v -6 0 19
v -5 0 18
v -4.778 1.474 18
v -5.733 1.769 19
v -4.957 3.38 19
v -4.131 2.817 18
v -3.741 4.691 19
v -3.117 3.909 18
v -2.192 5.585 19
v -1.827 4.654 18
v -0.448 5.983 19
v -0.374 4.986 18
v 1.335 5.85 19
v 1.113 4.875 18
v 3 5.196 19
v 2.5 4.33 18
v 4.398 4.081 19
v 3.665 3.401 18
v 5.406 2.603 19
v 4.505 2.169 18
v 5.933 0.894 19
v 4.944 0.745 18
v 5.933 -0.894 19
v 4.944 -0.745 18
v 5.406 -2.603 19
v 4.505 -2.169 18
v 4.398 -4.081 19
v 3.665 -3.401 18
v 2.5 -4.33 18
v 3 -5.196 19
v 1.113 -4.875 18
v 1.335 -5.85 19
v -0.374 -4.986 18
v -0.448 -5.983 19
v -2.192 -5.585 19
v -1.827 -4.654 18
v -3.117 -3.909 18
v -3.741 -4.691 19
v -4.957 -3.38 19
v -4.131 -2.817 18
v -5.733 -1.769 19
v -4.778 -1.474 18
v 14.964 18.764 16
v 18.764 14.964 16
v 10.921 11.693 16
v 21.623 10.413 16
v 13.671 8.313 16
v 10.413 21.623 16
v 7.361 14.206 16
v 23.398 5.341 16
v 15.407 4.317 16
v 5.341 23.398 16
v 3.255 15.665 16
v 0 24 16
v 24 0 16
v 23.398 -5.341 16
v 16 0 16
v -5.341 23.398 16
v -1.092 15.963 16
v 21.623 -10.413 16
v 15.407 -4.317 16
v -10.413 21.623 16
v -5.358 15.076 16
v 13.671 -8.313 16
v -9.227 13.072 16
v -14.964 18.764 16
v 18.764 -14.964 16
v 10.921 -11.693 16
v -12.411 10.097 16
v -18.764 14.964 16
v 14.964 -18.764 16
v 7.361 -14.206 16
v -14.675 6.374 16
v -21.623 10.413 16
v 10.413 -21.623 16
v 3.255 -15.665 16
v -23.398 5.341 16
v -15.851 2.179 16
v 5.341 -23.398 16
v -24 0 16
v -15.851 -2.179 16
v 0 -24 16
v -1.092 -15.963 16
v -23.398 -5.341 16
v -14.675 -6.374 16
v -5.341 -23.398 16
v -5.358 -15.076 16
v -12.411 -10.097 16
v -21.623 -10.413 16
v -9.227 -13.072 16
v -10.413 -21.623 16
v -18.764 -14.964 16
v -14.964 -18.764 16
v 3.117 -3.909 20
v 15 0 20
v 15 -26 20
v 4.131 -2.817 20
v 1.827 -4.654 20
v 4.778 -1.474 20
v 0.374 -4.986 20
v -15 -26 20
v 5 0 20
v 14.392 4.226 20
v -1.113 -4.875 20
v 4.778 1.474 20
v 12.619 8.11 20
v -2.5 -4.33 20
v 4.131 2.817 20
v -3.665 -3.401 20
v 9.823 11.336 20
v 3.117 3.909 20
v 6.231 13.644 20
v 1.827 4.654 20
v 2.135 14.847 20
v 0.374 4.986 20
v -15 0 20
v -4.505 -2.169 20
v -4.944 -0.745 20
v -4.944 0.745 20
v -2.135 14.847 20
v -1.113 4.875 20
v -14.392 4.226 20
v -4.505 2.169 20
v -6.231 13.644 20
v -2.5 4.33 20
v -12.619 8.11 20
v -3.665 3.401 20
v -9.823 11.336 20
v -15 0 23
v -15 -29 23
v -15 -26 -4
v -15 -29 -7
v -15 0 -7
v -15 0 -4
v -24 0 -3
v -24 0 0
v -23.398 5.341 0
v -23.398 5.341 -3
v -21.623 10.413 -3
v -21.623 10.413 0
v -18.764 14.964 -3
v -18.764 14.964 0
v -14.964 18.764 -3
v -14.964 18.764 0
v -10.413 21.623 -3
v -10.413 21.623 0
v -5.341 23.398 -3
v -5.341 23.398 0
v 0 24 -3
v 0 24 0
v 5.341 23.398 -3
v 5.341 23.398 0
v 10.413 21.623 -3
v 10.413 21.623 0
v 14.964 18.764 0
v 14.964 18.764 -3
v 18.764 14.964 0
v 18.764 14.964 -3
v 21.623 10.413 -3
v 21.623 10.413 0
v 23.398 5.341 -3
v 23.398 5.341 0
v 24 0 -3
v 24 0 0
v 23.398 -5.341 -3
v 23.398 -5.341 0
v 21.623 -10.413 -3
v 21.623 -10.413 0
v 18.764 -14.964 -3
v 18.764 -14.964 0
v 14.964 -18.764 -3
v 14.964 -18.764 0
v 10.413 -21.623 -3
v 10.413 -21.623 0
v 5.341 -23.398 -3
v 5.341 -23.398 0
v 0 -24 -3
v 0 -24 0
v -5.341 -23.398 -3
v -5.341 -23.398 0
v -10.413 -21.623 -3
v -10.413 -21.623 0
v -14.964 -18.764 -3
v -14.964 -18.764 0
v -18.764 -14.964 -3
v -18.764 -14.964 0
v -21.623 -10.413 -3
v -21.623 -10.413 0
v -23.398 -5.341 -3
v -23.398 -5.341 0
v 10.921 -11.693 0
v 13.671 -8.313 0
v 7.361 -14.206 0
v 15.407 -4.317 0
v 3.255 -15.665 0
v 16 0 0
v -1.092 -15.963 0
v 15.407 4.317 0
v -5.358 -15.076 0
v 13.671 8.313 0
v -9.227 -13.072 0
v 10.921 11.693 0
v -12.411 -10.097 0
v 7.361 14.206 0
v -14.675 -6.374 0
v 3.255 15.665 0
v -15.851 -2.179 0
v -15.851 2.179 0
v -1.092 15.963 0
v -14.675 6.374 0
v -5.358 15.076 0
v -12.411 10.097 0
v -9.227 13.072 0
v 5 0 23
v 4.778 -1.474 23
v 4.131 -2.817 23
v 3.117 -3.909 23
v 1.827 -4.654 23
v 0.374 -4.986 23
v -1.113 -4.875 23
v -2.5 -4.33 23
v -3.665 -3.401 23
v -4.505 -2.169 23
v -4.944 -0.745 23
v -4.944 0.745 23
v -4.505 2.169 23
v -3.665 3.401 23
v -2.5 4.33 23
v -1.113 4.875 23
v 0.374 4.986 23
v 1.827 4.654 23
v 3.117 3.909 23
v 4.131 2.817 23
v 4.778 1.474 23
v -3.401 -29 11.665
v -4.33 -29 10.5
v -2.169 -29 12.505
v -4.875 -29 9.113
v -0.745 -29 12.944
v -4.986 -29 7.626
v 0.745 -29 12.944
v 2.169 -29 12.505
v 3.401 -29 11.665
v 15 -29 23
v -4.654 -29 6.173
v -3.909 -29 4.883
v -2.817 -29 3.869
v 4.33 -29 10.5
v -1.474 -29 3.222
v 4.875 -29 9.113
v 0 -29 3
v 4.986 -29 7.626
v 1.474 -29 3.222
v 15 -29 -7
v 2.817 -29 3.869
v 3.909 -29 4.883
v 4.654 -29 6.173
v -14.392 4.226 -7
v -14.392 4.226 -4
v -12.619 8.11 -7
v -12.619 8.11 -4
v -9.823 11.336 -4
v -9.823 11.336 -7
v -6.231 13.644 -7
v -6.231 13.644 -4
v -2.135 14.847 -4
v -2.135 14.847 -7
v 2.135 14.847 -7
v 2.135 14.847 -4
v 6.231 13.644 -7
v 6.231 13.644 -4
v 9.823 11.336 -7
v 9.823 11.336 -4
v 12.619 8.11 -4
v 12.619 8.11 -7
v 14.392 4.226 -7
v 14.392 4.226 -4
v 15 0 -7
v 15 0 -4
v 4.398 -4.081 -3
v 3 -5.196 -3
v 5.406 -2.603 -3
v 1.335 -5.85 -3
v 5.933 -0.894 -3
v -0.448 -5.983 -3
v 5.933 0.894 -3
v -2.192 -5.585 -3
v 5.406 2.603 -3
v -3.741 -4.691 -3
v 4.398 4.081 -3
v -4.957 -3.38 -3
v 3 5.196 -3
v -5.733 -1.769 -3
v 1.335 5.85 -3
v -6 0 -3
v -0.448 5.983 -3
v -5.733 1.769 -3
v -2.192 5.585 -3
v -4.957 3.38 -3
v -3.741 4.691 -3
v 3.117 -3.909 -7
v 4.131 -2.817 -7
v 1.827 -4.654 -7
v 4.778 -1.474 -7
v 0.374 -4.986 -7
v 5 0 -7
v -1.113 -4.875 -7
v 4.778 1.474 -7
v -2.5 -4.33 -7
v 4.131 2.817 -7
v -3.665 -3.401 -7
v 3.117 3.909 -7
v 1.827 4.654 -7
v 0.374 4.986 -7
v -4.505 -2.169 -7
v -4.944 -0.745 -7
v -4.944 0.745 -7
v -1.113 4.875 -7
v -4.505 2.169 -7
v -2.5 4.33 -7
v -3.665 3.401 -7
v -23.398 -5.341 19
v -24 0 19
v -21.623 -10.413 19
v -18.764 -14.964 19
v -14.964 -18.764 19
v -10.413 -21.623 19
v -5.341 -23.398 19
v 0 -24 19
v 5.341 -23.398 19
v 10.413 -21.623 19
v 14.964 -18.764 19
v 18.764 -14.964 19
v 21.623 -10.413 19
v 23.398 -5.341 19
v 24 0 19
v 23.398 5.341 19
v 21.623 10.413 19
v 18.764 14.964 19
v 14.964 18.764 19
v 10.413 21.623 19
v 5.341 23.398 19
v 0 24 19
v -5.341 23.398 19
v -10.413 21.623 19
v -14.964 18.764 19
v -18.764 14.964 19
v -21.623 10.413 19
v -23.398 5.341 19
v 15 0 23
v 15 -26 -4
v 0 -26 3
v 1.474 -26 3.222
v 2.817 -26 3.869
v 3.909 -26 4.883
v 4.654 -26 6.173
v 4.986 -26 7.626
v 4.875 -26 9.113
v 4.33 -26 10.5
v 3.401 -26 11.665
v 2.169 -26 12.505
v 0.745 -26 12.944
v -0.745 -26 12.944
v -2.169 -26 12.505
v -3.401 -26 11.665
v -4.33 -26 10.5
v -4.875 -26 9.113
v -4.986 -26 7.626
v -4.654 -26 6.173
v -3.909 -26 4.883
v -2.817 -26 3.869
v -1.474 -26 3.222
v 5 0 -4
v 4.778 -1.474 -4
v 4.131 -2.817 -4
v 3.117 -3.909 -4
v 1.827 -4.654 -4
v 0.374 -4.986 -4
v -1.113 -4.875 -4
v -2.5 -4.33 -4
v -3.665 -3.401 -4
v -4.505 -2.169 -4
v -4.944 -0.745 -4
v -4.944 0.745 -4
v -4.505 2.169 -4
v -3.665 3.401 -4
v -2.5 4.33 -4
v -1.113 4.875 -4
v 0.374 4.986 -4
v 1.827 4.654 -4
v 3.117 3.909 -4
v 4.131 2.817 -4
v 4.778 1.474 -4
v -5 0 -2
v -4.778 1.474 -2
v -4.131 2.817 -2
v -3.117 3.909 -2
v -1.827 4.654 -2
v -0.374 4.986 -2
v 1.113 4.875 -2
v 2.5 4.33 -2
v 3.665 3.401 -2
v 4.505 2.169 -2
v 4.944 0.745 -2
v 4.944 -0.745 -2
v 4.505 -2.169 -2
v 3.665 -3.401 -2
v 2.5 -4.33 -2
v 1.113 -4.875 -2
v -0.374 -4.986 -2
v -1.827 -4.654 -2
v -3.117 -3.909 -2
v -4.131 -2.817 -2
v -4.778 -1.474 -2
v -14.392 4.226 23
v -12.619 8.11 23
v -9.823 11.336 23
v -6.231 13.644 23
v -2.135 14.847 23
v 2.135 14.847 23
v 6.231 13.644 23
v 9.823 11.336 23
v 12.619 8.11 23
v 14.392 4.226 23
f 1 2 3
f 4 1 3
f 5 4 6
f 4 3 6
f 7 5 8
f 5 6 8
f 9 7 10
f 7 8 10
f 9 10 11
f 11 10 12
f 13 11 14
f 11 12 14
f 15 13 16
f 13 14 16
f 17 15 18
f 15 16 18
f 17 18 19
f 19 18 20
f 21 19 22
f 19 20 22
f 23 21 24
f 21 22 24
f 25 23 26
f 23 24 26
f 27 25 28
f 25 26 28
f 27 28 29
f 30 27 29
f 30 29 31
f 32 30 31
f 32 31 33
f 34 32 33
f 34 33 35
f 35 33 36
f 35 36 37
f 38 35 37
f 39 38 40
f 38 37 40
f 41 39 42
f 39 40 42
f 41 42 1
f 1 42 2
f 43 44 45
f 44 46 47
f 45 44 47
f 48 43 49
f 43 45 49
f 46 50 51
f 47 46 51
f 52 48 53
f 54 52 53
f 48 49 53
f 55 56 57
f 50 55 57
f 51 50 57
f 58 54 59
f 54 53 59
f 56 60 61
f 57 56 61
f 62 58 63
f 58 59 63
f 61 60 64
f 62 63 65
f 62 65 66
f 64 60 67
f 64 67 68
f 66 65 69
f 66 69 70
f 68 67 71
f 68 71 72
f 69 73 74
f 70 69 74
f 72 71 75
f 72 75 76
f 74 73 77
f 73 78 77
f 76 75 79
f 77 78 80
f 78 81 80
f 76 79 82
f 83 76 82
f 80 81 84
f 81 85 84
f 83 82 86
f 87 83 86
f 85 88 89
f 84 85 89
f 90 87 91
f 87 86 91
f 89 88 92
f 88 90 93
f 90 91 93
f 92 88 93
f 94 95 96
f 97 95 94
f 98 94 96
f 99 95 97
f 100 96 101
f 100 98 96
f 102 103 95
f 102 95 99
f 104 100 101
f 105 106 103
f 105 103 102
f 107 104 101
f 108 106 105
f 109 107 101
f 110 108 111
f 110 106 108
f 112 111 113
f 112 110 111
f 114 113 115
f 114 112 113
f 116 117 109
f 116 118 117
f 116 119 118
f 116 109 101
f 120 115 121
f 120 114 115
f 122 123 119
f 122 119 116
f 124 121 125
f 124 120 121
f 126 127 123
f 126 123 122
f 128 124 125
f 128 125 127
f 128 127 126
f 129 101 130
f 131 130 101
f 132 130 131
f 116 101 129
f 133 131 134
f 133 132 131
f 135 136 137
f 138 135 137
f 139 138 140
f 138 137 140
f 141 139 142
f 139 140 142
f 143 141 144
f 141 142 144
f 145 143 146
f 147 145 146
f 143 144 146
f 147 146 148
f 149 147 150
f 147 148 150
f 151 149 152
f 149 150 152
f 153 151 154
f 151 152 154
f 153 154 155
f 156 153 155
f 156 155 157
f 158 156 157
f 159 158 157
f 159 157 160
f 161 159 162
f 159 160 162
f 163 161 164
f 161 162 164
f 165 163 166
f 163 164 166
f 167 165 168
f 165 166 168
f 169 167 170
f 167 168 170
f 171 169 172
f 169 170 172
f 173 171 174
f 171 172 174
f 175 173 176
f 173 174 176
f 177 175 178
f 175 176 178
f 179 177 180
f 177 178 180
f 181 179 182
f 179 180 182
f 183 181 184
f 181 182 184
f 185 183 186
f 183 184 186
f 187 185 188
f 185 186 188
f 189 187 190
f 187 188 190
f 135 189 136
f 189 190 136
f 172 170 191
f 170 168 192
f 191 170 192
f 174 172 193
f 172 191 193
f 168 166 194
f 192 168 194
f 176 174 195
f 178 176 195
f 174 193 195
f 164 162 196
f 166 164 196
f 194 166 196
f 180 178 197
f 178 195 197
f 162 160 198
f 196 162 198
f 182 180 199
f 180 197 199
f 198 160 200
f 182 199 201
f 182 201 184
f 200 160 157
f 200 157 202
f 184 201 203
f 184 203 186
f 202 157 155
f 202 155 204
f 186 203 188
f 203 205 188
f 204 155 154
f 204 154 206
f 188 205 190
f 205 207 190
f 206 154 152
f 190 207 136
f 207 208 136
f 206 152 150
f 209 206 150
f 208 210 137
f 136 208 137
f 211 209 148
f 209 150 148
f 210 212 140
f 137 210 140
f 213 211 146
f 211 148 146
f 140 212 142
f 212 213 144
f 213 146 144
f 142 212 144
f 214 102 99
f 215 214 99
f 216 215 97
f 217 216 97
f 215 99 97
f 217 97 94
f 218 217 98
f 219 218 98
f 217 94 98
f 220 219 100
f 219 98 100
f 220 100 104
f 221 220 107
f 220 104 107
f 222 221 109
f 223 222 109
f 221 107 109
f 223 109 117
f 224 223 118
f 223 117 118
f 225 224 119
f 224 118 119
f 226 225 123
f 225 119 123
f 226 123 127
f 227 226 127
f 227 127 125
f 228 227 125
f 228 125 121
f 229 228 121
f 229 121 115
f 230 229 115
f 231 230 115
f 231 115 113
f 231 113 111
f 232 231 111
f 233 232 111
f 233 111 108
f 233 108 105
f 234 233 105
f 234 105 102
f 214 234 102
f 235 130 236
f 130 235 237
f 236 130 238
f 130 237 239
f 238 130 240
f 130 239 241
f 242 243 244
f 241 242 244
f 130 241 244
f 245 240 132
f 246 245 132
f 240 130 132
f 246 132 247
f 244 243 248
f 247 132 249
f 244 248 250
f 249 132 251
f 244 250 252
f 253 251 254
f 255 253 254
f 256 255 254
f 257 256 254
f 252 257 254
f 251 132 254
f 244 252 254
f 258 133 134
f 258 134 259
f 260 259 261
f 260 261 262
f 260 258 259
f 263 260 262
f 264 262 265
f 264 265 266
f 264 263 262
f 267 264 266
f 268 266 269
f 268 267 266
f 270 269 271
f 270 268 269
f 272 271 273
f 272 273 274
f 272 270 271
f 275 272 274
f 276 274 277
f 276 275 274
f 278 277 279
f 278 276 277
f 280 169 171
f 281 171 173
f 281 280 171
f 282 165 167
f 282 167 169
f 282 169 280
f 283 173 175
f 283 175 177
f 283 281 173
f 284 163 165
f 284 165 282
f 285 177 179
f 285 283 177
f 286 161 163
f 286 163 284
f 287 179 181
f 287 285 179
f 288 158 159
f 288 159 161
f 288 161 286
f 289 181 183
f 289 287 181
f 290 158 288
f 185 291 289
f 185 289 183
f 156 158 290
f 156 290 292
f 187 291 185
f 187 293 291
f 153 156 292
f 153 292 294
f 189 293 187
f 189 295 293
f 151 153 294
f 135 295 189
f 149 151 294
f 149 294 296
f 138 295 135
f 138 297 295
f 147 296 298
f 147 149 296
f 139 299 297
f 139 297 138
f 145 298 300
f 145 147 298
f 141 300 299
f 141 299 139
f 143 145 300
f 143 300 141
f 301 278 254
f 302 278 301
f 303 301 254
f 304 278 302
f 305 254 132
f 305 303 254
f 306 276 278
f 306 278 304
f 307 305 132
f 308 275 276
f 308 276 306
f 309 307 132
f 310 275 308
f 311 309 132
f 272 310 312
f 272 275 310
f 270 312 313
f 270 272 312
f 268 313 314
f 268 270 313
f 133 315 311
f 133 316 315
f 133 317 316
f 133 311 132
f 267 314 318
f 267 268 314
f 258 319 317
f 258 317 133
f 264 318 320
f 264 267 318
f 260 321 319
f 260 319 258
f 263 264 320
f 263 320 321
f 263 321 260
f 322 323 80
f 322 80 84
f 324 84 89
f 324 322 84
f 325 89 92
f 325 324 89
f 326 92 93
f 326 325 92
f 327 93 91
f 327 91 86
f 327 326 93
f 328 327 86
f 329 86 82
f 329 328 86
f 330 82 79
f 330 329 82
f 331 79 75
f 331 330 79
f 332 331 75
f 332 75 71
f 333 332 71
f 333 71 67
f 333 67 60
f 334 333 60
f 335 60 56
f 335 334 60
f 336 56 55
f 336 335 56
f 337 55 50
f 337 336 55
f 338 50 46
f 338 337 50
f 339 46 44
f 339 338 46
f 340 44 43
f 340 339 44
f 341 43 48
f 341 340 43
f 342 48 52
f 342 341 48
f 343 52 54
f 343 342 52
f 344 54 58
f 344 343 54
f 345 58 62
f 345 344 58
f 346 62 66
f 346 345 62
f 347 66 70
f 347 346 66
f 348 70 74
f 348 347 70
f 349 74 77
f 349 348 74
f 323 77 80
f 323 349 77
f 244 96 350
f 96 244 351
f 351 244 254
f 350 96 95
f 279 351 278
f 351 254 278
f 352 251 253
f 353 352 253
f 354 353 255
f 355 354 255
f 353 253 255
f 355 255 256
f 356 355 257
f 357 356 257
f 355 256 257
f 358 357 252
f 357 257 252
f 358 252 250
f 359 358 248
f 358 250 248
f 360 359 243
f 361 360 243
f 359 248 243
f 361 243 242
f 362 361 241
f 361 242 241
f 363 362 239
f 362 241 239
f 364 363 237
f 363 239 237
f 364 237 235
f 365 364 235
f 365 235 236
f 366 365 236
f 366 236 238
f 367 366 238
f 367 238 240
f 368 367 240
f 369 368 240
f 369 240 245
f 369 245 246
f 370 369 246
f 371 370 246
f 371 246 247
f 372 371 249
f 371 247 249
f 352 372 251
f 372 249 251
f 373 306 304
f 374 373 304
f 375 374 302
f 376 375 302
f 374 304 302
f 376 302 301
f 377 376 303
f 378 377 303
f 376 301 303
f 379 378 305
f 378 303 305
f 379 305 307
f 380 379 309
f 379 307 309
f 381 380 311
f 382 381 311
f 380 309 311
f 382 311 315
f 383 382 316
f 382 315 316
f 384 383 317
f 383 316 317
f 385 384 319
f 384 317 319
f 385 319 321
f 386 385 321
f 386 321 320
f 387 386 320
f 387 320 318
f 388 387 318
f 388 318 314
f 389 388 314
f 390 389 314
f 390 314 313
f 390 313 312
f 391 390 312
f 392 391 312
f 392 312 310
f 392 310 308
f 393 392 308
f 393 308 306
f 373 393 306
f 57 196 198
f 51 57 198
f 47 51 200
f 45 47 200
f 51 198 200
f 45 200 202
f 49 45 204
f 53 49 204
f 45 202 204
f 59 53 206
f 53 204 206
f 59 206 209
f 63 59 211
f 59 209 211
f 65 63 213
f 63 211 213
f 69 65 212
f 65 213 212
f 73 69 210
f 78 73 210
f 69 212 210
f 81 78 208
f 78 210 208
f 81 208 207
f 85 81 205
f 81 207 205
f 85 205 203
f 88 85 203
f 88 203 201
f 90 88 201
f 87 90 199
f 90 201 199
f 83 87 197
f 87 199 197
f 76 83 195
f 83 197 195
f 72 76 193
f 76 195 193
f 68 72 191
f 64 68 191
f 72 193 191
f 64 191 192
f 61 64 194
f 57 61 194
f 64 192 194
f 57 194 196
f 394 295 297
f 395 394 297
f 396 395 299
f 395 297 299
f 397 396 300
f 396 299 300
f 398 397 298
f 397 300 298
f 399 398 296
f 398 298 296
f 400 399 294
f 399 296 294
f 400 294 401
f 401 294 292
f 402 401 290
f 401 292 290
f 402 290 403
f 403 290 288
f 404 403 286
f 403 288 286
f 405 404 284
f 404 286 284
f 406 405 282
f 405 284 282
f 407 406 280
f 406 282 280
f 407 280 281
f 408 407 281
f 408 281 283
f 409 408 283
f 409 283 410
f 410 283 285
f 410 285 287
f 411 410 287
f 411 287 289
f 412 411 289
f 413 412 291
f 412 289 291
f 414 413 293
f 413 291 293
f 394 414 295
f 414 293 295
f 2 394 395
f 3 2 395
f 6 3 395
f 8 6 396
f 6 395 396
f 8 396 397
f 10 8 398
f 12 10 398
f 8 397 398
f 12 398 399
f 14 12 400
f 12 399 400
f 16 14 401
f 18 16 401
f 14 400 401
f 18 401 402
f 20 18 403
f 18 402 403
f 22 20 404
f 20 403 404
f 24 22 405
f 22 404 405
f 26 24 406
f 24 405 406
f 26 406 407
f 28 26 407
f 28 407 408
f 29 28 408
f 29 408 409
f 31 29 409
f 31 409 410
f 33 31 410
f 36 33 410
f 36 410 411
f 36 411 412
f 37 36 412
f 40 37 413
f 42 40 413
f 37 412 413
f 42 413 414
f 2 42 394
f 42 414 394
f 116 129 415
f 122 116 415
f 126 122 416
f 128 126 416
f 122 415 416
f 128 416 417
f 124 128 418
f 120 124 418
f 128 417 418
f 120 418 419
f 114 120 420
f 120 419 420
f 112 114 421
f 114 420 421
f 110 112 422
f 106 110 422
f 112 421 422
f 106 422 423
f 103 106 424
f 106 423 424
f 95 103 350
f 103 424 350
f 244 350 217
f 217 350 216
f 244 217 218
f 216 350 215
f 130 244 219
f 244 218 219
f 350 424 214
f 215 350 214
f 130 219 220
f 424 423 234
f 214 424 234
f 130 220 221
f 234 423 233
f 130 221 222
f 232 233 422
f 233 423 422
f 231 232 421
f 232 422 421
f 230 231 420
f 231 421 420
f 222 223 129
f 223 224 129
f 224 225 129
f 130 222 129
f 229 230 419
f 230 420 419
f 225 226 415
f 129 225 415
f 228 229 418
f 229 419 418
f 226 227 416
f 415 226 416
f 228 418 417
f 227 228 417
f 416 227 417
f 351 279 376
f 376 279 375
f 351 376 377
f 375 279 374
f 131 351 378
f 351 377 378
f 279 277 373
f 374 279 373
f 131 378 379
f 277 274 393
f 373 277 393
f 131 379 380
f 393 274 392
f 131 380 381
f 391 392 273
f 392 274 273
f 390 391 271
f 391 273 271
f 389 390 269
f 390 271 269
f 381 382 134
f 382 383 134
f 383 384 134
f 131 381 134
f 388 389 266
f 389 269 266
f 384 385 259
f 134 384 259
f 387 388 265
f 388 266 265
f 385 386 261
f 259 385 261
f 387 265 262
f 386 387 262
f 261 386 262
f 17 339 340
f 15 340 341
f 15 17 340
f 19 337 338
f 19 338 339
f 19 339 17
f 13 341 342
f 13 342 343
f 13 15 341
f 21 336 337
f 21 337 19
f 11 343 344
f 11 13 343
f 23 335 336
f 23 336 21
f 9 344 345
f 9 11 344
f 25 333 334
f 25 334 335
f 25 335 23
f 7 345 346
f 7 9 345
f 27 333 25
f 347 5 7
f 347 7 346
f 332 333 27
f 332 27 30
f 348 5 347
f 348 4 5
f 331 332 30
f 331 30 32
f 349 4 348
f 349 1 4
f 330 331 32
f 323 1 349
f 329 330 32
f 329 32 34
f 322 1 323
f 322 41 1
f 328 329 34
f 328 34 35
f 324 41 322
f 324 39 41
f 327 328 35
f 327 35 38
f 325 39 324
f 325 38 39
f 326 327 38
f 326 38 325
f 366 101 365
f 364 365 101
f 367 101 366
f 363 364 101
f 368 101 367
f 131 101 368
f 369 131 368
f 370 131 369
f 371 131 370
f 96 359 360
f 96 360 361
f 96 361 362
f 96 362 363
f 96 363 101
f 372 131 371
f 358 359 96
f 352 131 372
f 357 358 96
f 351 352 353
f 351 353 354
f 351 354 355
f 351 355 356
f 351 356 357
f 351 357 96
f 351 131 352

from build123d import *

# Parameters (mm, degrees)
SKETCH_3_R          = 16
EXTRUDE_3_DEPTH     = 16
SKETCH_4_R          = 24
EXTRUDE_4_DEPTH     = 3
EXTRUDE_START       = 3
SKETCH_5_R          = 24
EXTRUDE_5_DEPTH     = 3
SKETCH_6_R          = 5
CUT_EXTRUDE_1_DEPTH = 22
CHAMFER_1_SIZE      = 1
EXTRUDE_6_DEPTH     = 3
EXTRUDE_7_REACH     = 48.325
SKETCH_9_W          = 30
SKETCH_9_H          = 3
SKETCH_10_R         = 5
CUT_EXTRUDE_2_DEPTH = 30
SKETCH_11_R         = 5
CUT_EXTRUDE_3_DEPTH = 3


with BuildPart() as part:
    # 草图3 → 凸台-拉伸3 (new body)
    with BuildSketch(Plane.XY):
        Circle(SKETCH_3_R)
    extrude(amount=EXTRUDE_3_DEPTH)

    # 草图4 → 凸台-拉伸4 (add)
    with BuildSketch(Plane(origin=(0, 0, 0), x_dir=(-1, 0, 0), z_dir=(0, 0, -1))):
        Circle(SKETCH_4_R)
    extrude(amount=EXTRUDE_4_DEPTH)

    # 草图5 → 凸台-拉伸5 (add)
    with BuildSketch(Plane.XY.offset(16).offset(EXTRUDE_START)):
        with Locations(Location((0, 0, 0), (0, 0, 180))):
            Circle(SKETCH_5_R)
    extrude(amount=-EXTRUDE_5_DEPTH)

    # 草图6 → 切除-拉伸1 (cut)
    with BuildSketch(Plane(origin=(0, 0, -3), x_dir=(-1, 0, 0), z_dir=(0, 0, -1))):
        Circle(SKETCH_6_R)
    extrude(amount=-CUT_EXTRUDE_1_DEPTH, mode=Mode.SUBTRACT)

    # 倒角1
    chamfer_1_edges = [part.edges().sort_by_distance(p)[0] for p in [
        (5, 0, -3),
        (5, 0, 19),
    ]]
    chamfer(chamfer_1_edges, length=CHAMFER_1_SIZE)


with BuildPart() as body_2:
    # 草图8 → 凸台-拉伸6 (new body)
    with BuildSketch(Plane(origin=(0, 0, -7), x_dir=(-1, 0, 0), z_dir=(0, 0, -1))):
        with BuildLine():
            Line((-15, 0), (-15, -29))
            Line((-15, -29), (15, -29))
            Line((15, -29), (15, 0))
            ThreePointArc((15, 0), (0, 15), (-15, 0))
        make_face()
    extrude(amount=-EXTRUDE_6_DEPTH)


with BuildPart() as body_3:
    # 镜向5: mirrored copy
    add(body_2.part.mirror(Plane.XY.offset(8)))

    # 草图9 → 凸台-拉伸7 (add, up to next)
    with BuildSketch(Plane.XY.offset(-4), mode=Mode.PRIVATE) as extrude_7_sk1:
        with Locations((0, -27.5)):
            Rectangle(SKETCH_9_W, SKETCH_9_H)
    extrude_7_tool1 = extrude(extrude_7_sk1.sketch, amount=EXTRUDE_7_REACH, mode=Mode.PRIVATE) - body_3.part

    add(body_2.part)  # 凸台-拉伸7 merges body 2
    add(extrude_7_tool1.solids().sort_by_distance((0, -27.5, -4))[0])

    # 草图10 → 切除-拉伸2 (cut)
    with BuildSketch(Plane(origin=(0, 0, -7), x_dir=(-1, 0, 0), z_dir=(0, 0, -1))):
        with Locations(Location((0, 0, 0), (0, 0, 180))):
            Circle(SKETCH_10_R)
    extrude(amount=-CUT_EXTRUDE_2_DEPTH, mode=Mode.SUBTRACT)

    # 草图11 → 切除-拉伸3 (cut)
    with BuildSketch(Plane.XZ.offset(29)):
        with Locations(Location((0, 8, 0), (0, 0, 270))):
            Circle(SKETCH_11_R)
    extrude(amount=-CUT_EXTRUDE_3_DEPTH, mode=Mode.SUBTRACT)


solid = Compound([part.part, body_3.part])
